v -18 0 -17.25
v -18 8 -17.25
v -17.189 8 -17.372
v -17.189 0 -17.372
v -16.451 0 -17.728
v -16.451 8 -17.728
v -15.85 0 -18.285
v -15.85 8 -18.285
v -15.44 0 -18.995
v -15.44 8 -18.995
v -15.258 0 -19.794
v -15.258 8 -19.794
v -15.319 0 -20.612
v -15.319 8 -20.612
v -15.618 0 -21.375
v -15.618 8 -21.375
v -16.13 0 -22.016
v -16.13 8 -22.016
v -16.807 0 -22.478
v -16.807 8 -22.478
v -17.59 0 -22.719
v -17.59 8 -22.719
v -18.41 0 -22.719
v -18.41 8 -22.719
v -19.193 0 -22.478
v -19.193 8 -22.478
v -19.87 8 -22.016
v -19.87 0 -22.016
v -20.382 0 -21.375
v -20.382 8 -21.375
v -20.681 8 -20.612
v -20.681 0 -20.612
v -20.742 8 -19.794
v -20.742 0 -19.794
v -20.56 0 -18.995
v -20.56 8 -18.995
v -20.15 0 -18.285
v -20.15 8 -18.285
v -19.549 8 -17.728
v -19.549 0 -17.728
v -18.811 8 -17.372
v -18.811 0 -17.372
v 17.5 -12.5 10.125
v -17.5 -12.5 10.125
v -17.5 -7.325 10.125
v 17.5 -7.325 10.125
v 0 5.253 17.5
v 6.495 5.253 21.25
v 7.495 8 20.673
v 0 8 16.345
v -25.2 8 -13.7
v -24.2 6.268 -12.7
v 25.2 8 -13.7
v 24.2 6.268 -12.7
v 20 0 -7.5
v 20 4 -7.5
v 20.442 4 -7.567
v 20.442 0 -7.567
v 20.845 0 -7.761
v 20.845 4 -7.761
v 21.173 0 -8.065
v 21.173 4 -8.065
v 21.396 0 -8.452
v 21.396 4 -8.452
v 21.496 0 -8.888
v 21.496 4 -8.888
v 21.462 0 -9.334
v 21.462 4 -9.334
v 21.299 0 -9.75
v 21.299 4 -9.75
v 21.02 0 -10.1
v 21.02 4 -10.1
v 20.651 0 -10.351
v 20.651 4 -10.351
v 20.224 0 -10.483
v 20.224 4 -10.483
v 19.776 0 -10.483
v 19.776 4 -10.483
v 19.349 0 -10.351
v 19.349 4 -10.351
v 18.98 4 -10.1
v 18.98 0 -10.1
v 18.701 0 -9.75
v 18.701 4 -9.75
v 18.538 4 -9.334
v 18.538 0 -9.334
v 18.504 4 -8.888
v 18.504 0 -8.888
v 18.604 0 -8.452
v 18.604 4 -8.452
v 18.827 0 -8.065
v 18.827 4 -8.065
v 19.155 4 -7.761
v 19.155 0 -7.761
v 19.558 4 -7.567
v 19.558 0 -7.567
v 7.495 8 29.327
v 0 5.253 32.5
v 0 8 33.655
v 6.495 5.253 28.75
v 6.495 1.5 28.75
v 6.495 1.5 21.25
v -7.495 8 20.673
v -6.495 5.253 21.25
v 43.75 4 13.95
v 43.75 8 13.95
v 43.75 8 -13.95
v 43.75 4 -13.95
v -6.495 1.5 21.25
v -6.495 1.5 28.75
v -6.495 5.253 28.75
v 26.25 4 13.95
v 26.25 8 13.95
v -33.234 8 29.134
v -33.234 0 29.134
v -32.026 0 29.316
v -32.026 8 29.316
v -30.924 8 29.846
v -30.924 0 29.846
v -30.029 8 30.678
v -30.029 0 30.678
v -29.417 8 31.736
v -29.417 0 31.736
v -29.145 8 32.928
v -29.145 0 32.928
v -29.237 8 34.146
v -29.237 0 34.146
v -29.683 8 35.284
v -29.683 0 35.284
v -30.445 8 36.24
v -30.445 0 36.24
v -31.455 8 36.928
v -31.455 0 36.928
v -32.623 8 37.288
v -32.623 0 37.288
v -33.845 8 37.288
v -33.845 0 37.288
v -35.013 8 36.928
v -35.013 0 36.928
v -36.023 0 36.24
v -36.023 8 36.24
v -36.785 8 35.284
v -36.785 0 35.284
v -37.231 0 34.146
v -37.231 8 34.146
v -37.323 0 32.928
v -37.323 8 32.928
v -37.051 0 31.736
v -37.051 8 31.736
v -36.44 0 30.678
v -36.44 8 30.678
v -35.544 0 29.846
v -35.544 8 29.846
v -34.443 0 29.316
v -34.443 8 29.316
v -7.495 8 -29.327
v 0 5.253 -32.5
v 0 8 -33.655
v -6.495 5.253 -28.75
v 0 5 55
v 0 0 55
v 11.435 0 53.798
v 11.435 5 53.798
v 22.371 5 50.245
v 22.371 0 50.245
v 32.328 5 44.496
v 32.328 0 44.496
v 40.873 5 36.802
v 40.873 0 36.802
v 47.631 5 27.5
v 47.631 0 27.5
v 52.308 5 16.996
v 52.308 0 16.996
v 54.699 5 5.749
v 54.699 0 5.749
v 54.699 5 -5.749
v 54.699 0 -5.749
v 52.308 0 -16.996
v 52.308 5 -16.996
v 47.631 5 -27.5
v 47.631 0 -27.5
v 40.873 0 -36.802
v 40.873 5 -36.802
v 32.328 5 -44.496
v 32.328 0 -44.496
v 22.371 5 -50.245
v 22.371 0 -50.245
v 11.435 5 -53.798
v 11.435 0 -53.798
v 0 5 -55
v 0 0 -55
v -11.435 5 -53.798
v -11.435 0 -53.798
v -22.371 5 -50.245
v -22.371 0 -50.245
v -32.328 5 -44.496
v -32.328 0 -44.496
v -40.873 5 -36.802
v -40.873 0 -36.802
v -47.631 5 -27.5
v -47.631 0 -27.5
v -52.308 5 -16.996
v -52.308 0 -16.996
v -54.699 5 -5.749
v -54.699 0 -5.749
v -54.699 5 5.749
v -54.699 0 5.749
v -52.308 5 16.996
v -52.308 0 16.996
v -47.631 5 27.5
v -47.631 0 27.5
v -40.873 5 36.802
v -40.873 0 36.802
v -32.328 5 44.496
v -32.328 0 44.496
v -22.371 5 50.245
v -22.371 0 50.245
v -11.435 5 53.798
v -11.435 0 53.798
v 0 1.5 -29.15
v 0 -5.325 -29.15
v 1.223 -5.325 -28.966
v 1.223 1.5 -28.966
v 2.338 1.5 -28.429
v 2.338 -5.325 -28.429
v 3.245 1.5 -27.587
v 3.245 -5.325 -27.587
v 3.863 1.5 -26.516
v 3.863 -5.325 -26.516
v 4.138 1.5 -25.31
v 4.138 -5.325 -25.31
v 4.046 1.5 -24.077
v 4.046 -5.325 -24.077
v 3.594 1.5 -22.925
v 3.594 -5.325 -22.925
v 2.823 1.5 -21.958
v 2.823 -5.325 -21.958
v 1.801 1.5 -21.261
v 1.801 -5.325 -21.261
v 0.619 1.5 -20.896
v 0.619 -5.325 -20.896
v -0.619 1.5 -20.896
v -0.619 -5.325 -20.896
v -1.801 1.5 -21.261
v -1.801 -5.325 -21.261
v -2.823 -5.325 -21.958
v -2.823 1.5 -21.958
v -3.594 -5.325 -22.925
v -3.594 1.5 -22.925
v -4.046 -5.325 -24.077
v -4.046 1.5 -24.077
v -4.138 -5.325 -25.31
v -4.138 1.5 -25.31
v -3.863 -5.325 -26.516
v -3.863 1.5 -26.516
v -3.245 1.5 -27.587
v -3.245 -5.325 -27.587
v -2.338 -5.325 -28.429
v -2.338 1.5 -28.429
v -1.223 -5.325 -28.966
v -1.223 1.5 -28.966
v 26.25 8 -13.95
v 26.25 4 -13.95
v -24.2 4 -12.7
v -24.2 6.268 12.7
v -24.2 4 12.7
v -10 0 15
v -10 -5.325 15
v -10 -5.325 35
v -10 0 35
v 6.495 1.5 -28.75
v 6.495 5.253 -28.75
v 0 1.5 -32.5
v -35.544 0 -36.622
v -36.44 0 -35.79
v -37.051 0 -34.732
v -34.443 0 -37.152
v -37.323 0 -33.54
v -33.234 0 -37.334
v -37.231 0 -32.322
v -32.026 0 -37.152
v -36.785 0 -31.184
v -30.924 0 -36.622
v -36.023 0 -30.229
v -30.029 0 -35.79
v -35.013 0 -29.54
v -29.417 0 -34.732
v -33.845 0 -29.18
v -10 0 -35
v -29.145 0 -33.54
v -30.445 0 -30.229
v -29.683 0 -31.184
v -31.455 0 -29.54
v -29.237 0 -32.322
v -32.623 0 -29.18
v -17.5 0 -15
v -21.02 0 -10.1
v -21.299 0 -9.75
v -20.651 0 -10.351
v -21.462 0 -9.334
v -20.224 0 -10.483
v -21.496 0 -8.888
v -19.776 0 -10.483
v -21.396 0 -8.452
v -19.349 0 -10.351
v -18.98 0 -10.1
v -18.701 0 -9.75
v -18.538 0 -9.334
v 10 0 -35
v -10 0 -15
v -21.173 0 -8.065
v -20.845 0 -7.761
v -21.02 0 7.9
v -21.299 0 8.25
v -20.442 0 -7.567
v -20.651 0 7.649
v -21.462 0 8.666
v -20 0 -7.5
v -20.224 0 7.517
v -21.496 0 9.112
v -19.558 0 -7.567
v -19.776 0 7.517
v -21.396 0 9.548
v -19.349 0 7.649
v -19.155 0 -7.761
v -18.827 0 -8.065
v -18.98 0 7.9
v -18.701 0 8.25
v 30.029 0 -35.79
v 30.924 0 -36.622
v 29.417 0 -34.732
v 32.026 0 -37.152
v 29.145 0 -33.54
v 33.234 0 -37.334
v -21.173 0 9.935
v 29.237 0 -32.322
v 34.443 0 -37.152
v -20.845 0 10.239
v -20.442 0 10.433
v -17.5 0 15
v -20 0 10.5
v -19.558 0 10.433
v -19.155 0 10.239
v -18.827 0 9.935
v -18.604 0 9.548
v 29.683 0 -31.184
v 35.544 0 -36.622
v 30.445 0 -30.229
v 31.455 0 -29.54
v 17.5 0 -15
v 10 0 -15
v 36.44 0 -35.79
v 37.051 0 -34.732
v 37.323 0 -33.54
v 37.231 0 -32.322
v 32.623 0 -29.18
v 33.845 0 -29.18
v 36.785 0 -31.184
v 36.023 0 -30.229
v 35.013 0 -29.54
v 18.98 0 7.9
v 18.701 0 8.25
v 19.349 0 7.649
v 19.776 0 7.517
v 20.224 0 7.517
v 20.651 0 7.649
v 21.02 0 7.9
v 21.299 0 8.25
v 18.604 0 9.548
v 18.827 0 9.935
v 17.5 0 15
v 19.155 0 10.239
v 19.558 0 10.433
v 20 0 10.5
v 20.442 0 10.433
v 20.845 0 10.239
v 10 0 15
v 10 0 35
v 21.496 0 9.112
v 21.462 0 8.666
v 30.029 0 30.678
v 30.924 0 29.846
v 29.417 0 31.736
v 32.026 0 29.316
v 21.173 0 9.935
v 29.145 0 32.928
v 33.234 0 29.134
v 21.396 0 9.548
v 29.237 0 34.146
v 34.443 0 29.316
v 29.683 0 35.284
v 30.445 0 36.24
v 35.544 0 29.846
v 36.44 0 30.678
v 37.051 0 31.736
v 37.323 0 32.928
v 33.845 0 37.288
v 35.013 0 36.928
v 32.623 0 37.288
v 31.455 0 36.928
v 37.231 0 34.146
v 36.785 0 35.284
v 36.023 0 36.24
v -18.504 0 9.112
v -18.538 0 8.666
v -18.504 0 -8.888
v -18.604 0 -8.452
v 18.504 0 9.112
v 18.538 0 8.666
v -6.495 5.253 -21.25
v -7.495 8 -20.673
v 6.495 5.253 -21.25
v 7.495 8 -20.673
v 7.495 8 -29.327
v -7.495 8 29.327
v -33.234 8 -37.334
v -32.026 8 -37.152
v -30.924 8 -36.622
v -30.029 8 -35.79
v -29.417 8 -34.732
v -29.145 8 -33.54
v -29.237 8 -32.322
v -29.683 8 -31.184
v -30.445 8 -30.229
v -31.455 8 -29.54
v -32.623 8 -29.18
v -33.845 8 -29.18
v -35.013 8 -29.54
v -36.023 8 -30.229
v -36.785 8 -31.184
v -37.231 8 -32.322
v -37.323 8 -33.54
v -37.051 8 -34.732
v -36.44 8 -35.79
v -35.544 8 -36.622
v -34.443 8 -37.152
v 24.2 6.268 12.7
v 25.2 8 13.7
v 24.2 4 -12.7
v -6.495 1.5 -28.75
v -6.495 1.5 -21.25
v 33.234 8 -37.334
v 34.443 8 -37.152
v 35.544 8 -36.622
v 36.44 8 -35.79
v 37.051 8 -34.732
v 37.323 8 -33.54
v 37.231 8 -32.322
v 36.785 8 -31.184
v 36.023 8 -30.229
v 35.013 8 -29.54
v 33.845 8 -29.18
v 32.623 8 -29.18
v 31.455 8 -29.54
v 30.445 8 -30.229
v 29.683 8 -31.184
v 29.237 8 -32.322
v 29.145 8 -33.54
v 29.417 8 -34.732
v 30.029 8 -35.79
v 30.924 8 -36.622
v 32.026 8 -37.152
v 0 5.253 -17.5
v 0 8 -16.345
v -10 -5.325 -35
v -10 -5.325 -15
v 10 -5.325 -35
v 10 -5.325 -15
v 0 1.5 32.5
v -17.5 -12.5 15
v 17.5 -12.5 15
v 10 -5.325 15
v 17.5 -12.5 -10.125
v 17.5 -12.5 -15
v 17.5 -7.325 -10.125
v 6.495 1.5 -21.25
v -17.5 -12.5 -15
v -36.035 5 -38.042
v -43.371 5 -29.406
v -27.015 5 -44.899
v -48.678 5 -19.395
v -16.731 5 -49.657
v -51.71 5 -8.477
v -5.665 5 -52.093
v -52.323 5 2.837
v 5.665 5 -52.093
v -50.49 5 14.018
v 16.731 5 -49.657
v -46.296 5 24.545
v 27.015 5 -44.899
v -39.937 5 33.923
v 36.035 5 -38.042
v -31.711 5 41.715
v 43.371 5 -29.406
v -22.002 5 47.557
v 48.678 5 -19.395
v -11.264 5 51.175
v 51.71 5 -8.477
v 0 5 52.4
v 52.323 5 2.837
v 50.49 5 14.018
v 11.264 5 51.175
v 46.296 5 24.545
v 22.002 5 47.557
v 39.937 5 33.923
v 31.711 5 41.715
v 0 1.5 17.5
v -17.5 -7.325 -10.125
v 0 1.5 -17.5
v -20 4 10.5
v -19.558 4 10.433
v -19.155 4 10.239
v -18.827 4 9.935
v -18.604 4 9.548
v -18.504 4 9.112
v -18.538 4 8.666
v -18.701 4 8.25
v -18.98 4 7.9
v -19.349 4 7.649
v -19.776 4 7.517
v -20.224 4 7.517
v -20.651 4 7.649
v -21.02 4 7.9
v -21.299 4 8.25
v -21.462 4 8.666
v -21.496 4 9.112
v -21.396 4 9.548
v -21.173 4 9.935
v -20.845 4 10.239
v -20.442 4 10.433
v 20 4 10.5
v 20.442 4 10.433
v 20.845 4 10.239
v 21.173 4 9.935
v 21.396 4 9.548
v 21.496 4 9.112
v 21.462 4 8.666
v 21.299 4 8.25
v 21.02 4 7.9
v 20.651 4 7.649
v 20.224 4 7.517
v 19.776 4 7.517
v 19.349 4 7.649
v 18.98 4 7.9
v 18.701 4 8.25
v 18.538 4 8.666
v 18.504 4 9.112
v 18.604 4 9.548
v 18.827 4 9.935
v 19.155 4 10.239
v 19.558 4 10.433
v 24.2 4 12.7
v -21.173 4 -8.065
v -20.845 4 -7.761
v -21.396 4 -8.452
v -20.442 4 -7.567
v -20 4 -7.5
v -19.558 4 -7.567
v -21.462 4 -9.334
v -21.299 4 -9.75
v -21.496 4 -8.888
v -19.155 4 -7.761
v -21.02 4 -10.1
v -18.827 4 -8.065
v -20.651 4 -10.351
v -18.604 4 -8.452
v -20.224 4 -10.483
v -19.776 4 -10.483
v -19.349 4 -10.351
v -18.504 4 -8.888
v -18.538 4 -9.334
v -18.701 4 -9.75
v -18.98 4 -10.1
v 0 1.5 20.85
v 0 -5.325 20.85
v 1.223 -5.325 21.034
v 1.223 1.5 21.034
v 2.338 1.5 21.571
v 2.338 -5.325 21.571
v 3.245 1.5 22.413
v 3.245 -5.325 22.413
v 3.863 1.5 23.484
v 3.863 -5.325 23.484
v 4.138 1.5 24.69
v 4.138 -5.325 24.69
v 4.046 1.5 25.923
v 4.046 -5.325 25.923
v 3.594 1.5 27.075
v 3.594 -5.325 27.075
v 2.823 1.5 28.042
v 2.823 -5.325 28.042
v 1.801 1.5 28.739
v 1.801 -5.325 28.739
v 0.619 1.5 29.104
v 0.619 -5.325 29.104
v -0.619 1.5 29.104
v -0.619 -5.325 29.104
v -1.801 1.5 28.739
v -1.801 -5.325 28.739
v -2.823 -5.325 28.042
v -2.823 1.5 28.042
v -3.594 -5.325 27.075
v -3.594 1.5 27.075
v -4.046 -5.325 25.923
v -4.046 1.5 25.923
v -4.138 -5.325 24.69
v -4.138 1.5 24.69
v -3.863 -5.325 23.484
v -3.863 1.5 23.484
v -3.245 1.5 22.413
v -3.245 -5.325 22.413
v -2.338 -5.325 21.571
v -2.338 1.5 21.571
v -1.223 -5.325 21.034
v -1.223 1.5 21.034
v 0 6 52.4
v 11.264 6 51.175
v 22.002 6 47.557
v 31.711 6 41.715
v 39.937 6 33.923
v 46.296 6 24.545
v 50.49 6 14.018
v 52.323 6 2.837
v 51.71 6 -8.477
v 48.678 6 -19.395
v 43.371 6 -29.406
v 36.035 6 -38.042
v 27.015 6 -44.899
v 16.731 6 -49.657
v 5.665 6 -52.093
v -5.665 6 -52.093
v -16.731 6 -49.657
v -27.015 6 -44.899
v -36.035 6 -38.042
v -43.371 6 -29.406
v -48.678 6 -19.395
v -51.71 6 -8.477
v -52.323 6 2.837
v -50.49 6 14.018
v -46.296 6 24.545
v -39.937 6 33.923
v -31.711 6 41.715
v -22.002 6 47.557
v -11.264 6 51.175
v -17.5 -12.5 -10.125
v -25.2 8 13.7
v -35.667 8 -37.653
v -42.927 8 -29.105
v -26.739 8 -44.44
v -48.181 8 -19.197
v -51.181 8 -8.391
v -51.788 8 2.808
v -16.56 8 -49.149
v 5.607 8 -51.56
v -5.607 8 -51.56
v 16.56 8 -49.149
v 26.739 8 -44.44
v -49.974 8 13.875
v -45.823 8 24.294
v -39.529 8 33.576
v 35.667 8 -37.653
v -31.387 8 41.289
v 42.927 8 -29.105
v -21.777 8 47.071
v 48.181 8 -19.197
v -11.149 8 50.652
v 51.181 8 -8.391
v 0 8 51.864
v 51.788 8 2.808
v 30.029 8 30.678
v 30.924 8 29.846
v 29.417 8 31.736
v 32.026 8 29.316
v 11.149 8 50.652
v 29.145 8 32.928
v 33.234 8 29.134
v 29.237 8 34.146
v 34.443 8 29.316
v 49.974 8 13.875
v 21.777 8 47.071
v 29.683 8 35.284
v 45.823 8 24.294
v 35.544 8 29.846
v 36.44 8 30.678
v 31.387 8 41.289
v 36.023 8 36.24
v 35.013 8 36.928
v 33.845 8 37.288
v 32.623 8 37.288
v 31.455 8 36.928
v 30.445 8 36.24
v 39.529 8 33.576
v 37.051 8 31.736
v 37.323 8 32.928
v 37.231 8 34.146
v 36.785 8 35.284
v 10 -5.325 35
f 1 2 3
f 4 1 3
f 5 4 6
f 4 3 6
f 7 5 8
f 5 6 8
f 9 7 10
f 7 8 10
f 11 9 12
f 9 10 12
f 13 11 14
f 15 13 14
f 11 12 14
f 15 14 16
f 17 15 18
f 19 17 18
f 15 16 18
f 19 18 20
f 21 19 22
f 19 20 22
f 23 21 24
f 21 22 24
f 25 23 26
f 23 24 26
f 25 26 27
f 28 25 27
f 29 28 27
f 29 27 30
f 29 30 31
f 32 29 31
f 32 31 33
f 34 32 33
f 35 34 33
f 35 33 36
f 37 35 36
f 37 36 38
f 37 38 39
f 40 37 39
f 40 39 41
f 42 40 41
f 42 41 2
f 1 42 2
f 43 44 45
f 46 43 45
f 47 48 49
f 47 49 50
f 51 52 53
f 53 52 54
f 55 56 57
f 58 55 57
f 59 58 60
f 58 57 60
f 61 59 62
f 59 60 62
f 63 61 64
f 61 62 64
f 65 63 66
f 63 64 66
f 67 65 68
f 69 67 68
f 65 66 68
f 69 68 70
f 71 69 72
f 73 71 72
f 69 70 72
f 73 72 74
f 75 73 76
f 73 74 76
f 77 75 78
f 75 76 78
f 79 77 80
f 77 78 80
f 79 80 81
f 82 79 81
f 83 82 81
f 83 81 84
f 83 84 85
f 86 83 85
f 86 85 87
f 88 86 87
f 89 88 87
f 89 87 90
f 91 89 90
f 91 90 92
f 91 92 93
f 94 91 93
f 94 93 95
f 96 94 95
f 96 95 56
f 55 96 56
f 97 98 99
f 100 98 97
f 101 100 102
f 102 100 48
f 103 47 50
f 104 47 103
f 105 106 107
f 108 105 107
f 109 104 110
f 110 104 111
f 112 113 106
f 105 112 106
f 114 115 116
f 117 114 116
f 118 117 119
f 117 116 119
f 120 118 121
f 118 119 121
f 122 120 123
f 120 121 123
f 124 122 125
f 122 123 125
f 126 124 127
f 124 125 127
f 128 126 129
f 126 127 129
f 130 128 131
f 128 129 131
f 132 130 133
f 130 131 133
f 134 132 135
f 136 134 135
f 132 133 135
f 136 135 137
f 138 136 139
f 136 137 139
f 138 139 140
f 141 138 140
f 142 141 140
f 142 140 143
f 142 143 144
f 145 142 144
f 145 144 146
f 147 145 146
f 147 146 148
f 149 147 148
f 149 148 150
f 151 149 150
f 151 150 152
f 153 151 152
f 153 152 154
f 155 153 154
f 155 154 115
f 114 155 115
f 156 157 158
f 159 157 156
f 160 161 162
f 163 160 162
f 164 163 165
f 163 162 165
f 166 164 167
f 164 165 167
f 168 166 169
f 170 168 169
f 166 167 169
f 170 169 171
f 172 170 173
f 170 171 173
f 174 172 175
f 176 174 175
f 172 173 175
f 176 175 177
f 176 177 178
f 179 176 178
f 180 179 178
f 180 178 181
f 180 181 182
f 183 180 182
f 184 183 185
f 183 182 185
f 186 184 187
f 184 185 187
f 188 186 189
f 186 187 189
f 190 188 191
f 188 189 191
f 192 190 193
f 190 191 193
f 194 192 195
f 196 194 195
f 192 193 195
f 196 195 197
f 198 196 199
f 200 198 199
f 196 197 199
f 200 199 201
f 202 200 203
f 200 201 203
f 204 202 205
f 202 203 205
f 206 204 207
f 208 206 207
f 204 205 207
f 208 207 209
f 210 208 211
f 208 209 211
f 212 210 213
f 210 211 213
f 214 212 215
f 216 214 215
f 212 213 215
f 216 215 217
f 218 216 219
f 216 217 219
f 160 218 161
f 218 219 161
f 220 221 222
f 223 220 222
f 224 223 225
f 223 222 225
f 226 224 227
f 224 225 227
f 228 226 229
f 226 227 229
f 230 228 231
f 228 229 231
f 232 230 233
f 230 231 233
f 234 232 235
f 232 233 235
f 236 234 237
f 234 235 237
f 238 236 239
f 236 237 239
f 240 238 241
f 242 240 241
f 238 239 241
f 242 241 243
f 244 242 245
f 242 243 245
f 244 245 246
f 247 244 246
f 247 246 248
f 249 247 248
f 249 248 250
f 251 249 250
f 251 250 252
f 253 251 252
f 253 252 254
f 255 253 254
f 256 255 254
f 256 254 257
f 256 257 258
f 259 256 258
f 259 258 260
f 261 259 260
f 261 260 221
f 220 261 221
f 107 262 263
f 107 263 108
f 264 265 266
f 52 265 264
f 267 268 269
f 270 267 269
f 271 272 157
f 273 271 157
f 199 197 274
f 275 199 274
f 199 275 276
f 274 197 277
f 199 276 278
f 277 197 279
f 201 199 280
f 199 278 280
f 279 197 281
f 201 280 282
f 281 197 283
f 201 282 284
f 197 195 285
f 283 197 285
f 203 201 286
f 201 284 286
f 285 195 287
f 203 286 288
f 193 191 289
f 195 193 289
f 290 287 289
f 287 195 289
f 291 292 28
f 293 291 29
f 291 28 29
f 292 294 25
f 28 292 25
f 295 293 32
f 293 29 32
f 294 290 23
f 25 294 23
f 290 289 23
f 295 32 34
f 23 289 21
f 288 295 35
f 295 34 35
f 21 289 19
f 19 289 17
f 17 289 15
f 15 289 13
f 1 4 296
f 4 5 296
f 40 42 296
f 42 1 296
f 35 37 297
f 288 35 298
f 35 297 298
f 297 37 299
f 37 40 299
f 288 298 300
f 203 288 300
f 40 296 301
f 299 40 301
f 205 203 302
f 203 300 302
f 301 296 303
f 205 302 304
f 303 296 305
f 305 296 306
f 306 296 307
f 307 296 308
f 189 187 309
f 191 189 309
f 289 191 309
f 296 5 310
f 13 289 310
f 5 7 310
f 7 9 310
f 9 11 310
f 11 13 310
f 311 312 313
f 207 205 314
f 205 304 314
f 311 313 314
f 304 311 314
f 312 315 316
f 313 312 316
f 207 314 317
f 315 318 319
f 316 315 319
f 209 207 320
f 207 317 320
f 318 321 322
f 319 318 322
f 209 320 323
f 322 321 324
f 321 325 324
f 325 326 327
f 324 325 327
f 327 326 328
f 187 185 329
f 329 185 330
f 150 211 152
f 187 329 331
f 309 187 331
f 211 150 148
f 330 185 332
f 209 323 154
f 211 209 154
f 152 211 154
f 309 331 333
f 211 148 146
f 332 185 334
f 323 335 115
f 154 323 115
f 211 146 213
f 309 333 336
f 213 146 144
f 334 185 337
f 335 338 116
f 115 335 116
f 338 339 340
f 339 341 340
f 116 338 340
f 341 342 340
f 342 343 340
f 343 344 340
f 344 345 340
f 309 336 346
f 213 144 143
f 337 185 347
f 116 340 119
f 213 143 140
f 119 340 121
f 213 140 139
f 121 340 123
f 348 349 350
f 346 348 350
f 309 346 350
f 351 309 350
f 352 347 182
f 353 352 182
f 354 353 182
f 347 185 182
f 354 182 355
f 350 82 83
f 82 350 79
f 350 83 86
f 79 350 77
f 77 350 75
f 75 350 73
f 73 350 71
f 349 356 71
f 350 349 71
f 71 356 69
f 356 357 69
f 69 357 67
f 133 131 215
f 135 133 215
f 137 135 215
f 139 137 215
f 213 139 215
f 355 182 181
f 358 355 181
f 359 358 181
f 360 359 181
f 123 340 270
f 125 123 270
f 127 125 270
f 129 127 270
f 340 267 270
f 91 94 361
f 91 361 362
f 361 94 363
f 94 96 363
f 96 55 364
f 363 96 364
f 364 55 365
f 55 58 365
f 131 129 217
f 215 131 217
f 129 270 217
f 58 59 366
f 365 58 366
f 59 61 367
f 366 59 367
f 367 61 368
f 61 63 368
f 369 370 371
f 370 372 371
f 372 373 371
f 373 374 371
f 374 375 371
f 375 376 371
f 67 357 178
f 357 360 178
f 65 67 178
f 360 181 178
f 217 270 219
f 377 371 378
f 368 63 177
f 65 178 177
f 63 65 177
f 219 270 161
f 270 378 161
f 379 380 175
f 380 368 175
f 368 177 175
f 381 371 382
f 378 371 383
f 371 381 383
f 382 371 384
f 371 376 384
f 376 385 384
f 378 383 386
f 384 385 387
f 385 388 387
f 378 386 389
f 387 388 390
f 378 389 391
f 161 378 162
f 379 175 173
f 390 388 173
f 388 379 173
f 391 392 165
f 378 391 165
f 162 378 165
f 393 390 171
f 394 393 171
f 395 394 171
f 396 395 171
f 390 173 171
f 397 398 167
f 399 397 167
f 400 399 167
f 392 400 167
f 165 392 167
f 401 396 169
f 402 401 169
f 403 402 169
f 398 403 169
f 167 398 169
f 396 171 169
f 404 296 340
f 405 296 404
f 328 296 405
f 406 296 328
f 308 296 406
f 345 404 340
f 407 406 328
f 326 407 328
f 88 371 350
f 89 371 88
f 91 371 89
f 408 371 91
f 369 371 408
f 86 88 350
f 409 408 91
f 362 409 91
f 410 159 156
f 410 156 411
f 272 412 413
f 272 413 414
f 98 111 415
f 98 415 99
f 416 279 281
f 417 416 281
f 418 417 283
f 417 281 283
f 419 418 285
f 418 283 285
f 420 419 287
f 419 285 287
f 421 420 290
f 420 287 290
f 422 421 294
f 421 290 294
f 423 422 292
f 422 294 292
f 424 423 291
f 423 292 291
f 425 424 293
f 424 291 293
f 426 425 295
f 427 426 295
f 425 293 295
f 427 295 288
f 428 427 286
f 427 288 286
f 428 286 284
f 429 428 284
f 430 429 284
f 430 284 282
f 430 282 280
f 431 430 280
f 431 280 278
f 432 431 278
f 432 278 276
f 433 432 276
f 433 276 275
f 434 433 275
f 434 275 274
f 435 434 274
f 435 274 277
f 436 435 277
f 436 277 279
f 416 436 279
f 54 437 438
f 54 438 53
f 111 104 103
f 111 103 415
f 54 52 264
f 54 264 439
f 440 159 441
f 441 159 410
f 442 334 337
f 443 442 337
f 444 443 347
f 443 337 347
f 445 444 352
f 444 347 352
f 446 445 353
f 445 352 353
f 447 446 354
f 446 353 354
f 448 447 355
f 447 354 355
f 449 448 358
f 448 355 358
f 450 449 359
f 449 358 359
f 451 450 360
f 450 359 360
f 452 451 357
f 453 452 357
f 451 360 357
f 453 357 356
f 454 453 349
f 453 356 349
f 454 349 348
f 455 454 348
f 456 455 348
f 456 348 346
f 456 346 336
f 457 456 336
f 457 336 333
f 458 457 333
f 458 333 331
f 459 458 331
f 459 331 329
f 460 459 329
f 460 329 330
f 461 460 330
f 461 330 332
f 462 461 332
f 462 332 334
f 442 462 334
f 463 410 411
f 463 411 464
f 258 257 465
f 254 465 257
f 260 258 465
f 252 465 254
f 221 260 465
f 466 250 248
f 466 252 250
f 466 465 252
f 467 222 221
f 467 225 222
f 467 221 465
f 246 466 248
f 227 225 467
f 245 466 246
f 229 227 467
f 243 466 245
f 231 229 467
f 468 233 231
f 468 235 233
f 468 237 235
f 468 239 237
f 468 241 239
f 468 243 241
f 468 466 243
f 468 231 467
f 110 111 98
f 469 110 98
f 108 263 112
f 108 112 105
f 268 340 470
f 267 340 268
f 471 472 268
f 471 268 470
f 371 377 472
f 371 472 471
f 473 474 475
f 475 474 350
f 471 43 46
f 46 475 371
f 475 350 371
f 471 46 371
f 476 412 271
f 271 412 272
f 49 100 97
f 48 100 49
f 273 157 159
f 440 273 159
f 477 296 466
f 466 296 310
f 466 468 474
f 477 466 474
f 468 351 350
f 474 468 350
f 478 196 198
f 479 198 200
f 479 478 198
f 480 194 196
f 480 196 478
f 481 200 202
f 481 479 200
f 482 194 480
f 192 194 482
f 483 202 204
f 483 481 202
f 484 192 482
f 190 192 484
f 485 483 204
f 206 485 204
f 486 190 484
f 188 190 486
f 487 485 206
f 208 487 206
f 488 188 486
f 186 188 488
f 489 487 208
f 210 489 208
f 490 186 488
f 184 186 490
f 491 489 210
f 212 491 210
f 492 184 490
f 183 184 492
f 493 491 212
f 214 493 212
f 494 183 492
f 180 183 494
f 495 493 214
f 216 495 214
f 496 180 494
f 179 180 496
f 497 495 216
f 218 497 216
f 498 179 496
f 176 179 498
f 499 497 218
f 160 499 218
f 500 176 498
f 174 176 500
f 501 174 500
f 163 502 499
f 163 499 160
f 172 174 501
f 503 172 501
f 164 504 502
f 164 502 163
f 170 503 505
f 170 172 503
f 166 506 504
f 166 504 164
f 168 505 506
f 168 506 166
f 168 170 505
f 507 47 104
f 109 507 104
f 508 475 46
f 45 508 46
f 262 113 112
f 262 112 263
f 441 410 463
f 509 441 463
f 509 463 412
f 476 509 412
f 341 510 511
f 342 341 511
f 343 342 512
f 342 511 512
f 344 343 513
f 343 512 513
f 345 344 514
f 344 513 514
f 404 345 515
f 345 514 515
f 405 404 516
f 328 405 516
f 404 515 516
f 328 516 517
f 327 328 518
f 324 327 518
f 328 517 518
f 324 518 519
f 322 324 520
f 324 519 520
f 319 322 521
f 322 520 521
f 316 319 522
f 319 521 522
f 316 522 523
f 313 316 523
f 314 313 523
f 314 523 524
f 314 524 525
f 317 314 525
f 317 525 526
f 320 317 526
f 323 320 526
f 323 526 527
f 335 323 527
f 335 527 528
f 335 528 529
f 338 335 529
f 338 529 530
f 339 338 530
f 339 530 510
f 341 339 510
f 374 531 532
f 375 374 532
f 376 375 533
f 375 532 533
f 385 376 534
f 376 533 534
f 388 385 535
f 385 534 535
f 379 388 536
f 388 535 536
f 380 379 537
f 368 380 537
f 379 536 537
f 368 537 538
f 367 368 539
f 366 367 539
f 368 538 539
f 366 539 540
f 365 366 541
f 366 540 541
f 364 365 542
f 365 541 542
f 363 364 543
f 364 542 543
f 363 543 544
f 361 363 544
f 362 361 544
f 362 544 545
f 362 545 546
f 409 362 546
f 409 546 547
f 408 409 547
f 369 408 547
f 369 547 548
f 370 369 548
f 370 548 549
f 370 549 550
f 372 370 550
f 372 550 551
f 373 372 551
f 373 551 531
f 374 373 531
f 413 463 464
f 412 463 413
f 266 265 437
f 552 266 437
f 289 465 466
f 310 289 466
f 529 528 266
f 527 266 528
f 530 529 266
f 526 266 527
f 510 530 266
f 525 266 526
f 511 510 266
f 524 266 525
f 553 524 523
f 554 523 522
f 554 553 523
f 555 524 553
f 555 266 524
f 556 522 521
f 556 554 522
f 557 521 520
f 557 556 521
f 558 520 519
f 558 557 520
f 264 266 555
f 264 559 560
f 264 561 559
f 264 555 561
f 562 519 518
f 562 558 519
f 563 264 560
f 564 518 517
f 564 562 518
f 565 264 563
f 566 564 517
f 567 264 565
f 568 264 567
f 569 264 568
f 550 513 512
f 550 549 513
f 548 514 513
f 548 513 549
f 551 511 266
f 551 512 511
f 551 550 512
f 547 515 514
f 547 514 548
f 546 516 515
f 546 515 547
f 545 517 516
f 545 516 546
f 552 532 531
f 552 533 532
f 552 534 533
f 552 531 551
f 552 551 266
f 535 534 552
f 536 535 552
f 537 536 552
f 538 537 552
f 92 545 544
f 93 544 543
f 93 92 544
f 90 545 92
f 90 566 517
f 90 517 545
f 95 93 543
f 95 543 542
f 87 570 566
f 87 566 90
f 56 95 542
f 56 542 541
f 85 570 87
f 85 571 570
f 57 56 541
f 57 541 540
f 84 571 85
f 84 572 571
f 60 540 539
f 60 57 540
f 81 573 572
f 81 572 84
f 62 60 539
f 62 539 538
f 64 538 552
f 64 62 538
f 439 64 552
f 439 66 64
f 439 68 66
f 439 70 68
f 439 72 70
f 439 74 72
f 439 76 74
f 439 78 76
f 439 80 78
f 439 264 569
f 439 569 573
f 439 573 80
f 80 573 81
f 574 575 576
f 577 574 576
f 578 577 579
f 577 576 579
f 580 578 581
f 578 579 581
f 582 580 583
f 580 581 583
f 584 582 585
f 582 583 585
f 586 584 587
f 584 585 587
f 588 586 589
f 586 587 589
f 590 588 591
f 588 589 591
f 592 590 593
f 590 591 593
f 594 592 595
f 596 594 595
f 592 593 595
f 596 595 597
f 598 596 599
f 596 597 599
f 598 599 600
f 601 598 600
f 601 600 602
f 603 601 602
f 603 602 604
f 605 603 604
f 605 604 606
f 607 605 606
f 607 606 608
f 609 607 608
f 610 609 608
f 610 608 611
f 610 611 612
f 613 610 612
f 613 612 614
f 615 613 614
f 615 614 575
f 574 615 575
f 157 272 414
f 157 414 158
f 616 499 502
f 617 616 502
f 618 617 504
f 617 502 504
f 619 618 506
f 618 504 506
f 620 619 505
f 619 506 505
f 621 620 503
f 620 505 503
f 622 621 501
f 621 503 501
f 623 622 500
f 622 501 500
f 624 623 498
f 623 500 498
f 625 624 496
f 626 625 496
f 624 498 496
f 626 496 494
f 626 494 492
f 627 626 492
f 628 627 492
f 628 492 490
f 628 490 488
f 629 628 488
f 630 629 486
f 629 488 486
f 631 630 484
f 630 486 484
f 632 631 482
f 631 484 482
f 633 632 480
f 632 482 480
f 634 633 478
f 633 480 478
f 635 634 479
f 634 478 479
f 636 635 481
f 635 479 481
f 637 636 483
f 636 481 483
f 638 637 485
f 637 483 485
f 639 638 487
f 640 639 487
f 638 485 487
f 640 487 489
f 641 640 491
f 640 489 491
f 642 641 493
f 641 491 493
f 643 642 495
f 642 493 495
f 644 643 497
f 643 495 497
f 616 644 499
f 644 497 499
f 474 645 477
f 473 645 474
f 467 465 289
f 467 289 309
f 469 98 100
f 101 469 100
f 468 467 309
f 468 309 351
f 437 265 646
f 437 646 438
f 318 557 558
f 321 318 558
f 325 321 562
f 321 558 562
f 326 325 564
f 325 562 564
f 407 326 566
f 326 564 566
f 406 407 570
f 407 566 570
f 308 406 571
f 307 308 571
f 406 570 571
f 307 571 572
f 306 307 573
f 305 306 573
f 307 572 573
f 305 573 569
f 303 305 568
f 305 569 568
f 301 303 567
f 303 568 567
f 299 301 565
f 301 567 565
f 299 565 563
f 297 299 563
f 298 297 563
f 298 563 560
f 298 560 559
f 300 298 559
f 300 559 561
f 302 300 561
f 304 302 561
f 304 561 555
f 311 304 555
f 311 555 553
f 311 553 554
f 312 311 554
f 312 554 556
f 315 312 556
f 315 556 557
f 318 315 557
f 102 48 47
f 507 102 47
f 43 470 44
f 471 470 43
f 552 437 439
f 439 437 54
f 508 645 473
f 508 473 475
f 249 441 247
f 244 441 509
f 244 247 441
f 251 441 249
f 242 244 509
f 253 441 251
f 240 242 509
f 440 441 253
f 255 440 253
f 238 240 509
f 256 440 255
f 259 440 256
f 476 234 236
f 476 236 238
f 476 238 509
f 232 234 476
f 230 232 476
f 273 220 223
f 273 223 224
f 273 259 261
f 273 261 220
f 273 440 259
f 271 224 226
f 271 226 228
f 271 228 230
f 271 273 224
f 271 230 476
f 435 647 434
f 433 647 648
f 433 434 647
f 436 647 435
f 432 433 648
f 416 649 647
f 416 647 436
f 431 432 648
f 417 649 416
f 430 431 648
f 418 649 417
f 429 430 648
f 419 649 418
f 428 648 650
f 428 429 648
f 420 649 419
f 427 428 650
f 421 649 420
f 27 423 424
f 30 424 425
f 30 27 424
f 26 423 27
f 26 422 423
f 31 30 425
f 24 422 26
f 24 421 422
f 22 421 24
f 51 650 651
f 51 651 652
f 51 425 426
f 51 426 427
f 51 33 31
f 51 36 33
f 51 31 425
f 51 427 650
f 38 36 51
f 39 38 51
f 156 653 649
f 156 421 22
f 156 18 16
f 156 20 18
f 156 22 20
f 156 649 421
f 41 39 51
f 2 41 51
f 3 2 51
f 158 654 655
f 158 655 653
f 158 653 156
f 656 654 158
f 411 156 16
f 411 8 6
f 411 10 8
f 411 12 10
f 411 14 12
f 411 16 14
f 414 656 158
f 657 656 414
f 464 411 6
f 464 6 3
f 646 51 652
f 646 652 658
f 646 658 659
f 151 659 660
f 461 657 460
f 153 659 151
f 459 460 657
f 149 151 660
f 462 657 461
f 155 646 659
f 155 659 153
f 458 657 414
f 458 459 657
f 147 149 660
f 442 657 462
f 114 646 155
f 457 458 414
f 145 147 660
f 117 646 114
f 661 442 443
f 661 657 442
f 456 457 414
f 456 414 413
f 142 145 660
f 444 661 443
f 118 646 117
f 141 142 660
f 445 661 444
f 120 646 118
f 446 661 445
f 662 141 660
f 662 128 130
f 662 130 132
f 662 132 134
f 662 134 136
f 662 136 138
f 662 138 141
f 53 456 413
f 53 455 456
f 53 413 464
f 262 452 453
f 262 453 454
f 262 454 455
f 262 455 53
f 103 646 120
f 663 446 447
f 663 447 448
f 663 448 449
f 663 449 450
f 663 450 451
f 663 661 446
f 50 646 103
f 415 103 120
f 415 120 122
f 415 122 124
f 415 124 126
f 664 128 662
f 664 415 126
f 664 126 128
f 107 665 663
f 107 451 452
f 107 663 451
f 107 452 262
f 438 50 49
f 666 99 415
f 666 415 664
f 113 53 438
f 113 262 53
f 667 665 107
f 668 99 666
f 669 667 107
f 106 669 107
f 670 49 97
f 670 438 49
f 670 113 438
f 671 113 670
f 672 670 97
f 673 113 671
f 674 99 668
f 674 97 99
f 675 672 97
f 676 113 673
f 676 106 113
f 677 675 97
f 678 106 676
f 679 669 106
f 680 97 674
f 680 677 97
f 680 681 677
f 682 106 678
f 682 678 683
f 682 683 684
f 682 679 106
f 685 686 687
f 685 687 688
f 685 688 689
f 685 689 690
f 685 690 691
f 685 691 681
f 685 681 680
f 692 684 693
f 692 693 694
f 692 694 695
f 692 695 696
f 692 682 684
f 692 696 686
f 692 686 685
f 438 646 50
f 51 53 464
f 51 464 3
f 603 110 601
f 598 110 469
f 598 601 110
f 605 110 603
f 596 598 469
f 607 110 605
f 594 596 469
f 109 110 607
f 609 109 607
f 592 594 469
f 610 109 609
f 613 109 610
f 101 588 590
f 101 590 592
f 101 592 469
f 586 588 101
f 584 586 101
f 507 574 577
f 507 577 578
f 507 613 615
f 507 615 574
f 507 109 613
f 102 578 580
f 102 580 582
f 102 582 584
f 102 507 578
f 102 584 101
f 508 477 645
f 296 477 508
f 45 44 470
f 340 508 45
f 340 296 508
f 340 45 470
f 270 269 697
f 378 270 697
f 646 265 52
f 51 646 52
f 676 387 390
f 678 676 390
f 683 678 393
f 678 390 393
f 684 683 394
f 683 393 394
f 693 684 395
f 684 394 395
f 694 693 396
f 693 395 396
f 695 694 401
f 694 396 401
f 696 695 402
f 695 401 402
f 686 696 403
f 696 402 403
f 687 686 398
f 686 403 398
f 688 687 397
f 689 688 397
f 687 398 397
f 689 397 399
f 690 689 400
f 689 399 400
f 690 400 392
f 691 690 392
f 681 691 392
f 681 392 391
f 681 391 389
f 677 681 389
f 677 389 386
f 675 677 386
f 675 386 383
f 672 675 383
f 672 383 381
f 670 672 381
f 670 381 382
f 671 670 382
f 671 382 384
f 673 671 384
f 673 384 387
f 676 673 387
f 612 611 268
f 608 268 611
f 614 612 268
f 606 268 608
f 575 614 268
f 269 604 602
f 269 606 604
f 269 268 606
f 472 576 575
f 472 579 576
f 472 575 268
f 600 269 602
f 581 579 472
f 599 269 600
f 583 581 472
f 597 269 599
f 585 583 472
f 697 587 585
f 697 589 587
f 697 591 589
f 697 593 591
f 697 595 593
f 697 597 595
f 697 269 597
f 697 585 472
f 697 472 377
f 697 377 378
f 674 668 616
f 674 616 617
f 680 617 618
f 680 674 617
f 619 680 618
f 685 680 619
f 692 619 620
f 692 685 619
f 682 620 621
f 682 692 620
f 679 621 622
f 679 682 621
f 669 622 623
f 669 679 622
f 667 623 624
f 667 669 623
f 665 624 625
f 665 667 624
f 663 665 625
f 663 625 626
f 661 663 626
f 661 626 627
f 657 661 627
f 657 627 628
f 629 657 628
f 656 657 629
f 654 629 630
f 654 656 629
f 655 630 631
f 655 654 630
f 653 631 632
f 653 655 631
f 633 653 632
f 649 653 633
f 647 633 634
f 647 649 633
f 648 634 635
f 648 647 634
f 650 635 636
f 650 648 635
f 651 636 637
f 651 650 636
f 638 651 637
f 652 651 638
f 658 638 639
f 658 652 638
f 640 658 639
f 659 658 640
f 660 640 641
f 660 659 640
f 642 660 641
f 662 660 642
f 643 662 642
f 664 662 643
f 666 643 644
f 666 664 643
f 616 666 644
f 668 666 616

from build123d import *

# Parameters (mm, degrees)
SKETCH_1_R          = 55
EXTRUDE_1_DEPTH     = 5
SKETCH_2_R          = 52.4
EXTRUDE_2_DEPTH     = 3
SKETCH_3_W          = 35
SKETCH_3_H          = 30
EXTRUDE_3_DEPTH     = 25
SKETCH_5_R          = 4.1
CUT_EXTRUDE_2_DEPTH = 9
SKETCH_6_R          = 2.75
CUT_EXTRUDE_3_DEPTH = 34
SKETCH2_W           = 20.25
SKETCH2_H           = 10.35
CUT_EXTRUDE1_DEPTH  = 73.5
SKETCH3_W           = 17.5
SKETCH3_H           = 27.9
SKETCH3_W_2         = 48.4
SKETCH3_H_2         = 25.4
CUT_EXTRUDE2_DEPTH  = 4
CHAMFER1_SIZE       = 2
CHAMFER1_SIZE2      = 0.535898385
SKETCH4_W           = 35
SKETCH4_H           = 30
CUT_EXTRUDE3_DEPTH  = 12.5
BOSS_EXTRUDE2_START = -2
SKETCH5_W           = 20
SKETCH5_H           = 70
BOSS_EXTRUDE2_DEPTH = 5.325
SKETCH6_R           = 4.15
CUT_EXTRUDE4_DEPTH  = 14.325
CUT_EXTRUDE5_DEPTH  = 6.5
CHAMFER2_SIZE       = 1
CHAMFER2_SIZE2      = 2.747477419
SKETCH8_R           = 1.5
CUT_EXTRUDE6_DEPTH  = 17.5
CHAMFER3_SIZE       = 1
CHAMFER3_SIZE2      = 1.732050808


with BuildPart() as part:
    # Эскиз1 → Бобышка-Вытянуть1 (new body)
    with BuildSketch(Plane(origin=(0, 0, 0), x_dir=(1, 0, 0), z_dir=(0, 1, 0))):
        with Locations(Location((0, 0, 0), (0, 0, 270))):  # turned: the seam where the file's is
            Circle(SKETCH_1_R)
    extrude(amount=EXTRUDE_1_DEPTH)

    # Эскиз2 → Бобышка-Вытянуть2 (add)
    with BuildSketch(Plane(origin=(0, 5, 0), x_dir=(1, 0, 0), z_dir=(0, 1, 0))):
        with Locations(Location((0, 0, 0), (0, 0, 270))):  # turned: the seam where the file's is
            Circle(SKETCH_2_R)
    extrude(amount=EXTRUDE_2_DEPTH)

    # Эскиз3 → Бобышка-Вытянуть3 (add)
    with BuildSketch(Plane.XZ):
        Rectangle(SKETCH_3_W, SKETCH_3_H)
    extrude(amount=EXTRUDE_3_DEPTH)

    # Эскиз5 → Вырез-Вытянуть2 (cut, through all)
    with BuildSketch(Plane.XZ):
        with Locations(Location((33.234018716, -33.234018716, 0), (0, 0, 270))):  # turned: the seam where the file's is
            Circle(SKETCH_5_R)
        with Locations(Location((-33.234018716, -33.234018716, 0), (0, 0, 270))):  # turned: the seam where the file's is
            Circle(SKETCH_5_R)
        with Locations(Location((-33.234018716, 33.234018716, 0), (0, 0, 270))):  # turned: the seam where the file's is
            Circle(SKETCH_5_R)
        with Locations(Location((33.234018716, 33.234018716, 0), (0, 0, 270))):  # turned: the seam where the file's is
            Circle(SKETCH_5_R)
    extrude(amount=-CUT_EXTRUDE_2_DEPTH, mode=Mode.SUBTRACT)

    # Эскиз6 → Вырез-Вытянуть3 (cut, through all)
    with BuildSketch(Plane(origin=(0, 8, 0), x_dir=(1, 0, 0), z_dir=(0, 1, 0))):
        with Locations(Location((-18, 20, 0), (0, 0, 270))):  # turned: the seam where the file's is
            Circle(SKETCH_6_R)
    extrude(amount=-CUT_EXTRUDE_3_DEPTH, mode=Mode.SUBTRACT)

    # Sketch2 → Cut-Extrude1 (cut, through all)
    with BuildSketch(Plane.ZY.offset(17.5)):
        with Locations((0, -12.5)):
            Rectangle(SKETCH2_W, SKETCH2_H)
    extrude(amount=-CUT_EXTRUDE1_DEPTH, mode=Mode.SUBTRACT)

    # Sketch3 → Cut-Extrude2 (cut)
    with BuildSketch(Plane(origin=(0, 8, 0), x_dir=(1, 0, 0), z_dir=(0, 1, 0))):
        with Locations((35, 0)):
            Rectangle(SKETCH3_W, SKETCH3_H)
        Rectangle(SKETCH3_W_2, SKETCH3_H_2)
    extrude(amount=-CUT_EXTRUDE2_DEPTH, mode=Mode.SUBTRACT)

    # Chamfer1
    chamfer1_edges = [part.edges().sort_by_distance(p)[0] for p in [
        (0, 8, -52.4),
    ]]
    chamfer1_side = [part.faces().sort_by_distance(p)[0] for p in [
        (0, 6.5, -52.4),
    ]]
    chamfer(chamfer1_edges, length=CHAMFER1_SIZE, length2=CHAMFER1_SIZE2, reference=chamfer1_side[0])

    # Sketch4 → Cut-Extrude3 (cut)
    with BuildSketch(Plane.XZ.offset(25)):
        Rectangle(SKETCH4_W, SKETCH4_H)
    extrude(amount=-CUT_EXTRUDE3_DEPTH, mode=Mode.SUBTRACT)

    # Sketch5 → Boss-Extrude2 (add)
    with BuildSketch(Plane.XZ.offset(7.325).offset(BOSS_EXTRUDE2_START)):
        Rectangle(SKETCH5_W, SKETCH5_H)
    extrude(amount=-BOSS_EXTRUDE2_DEPTH)

    # Sketch6 → Cut-Extrude4 (cut, through all)
    with BuildSketch(Plane.XZ.offset(5.325)):
        with Locations(Location((0, 25, 0), (0, 0, 270))):  # turned: the seam where the file's is
            Circle(SKETCH6_R)
        with Locations(Location((0, -25, 0), (0, 0, 270))):  # turned: the seam where the file's is
            Circle(SKETCH6_R)
    extrude(amount=-CUT_EXTRUDE4_DEPTH, mode=Mode.SUBTRACT)

    # Sketch7 → Cut-Extrude5 (cut)
    with BuildSketch(Plane(origin=(0, 8, 0), x_dir=(1, 0, 0), z_dir=(0, 1, 0))):
        Polygon((0, -32.5), (6.495190528, -28.75), (6.495190528, -21.25), (0, -17.5), (-6.495190528, -21.25), (-6.495190528, -28.75), align=None)
        Polygon((0, 17.5), (6.495190528, 21.25), (6.495190528, 28.75), (0, 32.5), (-6.495190528, 28.75), (-6.495190528, 21.25), align=None)
    extrude(amount=-CUT_EXTRUDE5_DEPTH, mode=Mode.SUBTRACT)

    # Chamfer2
    chamfer2_edges = [part.edges().sort_by_distance(p)[0] for p in [
        (-3.247595264, 8, 30.625),
        (3.247595264, 8, 30.625),
        (6.495190528, 8, 25),
        (3.247595264, 8, 19.375),
        (-3.247595264, 8, 19.375),
        (-6.495190528, 8, 25),
        (-3.247595264, 8, -19.375),
        (3.247595264, 8, -19.375),
        (6.495190528, 8, -25),
        (3.247595264, 8, -30.625),
        (-3.247595264, 8, -30.625),
        (-6.495190528, 8, -25),
    ]]
    chamfer2_side = [part.faces().sort_by_distance(p)[0] for p in [
        (0, 8, -50.397163297),
    ]]
    chamfer(chamfer2_edges, length=CHAMFER2_SIZE, length2=CHAMFER2_SIZE2, reference=chamfer2_side[0])

    # Sketch8 → Cut-Extrude6 (cut, through all)
    with BuildSketch(Plane(origin=(0, 4, 0), x_dir=(1, 0, 0), z_dir=(0, 1, 0))):
        with Locations(Location((20, 9, 0), (0, 0, 270))):  # turned: the seam where the file's is
            Circle(SKETCH8_R)
        with Locations(Location((20, -9, 0), (0, 0, 270))):  # turned: the seam where the file's is
            Circle(SKETCH8_R)
        with Locations(Location((-20, 9, 0), (0, 0, 270))):  # turned: the seam where the file's is
            Circle(SKETCH8_R)
        with Locations(Location((-20, -9, 0), (0, 0, 270))):  # turned: the seam where the file's is
            Circle(SKETCH8_R)
    extrude(amount=-CUT_EXTRUDE6_DEPTH, mode=Mode.SUBTRACT)

    # Chamfer3
    chamfer3_edges = [part.edges().sort_by_distance(p)[0] for p in [
        (24.2, 8, 0),
        (0, 8, -12.7),
        (-24.2, 8, 0),
        (0, 8, 12.7),
    ]]
    chamfer3_side = [part.faces().sort_by_distance(p)[0] for p in [
        (-4.481064423, 8, 32.761431253),
    ]]
    chamfer(chamfer3_edges, length=CHAMFER3_SIZE, length2=CHAMFER3_SIZE2, reference=chamfer3_side[0])


solid = part.part
